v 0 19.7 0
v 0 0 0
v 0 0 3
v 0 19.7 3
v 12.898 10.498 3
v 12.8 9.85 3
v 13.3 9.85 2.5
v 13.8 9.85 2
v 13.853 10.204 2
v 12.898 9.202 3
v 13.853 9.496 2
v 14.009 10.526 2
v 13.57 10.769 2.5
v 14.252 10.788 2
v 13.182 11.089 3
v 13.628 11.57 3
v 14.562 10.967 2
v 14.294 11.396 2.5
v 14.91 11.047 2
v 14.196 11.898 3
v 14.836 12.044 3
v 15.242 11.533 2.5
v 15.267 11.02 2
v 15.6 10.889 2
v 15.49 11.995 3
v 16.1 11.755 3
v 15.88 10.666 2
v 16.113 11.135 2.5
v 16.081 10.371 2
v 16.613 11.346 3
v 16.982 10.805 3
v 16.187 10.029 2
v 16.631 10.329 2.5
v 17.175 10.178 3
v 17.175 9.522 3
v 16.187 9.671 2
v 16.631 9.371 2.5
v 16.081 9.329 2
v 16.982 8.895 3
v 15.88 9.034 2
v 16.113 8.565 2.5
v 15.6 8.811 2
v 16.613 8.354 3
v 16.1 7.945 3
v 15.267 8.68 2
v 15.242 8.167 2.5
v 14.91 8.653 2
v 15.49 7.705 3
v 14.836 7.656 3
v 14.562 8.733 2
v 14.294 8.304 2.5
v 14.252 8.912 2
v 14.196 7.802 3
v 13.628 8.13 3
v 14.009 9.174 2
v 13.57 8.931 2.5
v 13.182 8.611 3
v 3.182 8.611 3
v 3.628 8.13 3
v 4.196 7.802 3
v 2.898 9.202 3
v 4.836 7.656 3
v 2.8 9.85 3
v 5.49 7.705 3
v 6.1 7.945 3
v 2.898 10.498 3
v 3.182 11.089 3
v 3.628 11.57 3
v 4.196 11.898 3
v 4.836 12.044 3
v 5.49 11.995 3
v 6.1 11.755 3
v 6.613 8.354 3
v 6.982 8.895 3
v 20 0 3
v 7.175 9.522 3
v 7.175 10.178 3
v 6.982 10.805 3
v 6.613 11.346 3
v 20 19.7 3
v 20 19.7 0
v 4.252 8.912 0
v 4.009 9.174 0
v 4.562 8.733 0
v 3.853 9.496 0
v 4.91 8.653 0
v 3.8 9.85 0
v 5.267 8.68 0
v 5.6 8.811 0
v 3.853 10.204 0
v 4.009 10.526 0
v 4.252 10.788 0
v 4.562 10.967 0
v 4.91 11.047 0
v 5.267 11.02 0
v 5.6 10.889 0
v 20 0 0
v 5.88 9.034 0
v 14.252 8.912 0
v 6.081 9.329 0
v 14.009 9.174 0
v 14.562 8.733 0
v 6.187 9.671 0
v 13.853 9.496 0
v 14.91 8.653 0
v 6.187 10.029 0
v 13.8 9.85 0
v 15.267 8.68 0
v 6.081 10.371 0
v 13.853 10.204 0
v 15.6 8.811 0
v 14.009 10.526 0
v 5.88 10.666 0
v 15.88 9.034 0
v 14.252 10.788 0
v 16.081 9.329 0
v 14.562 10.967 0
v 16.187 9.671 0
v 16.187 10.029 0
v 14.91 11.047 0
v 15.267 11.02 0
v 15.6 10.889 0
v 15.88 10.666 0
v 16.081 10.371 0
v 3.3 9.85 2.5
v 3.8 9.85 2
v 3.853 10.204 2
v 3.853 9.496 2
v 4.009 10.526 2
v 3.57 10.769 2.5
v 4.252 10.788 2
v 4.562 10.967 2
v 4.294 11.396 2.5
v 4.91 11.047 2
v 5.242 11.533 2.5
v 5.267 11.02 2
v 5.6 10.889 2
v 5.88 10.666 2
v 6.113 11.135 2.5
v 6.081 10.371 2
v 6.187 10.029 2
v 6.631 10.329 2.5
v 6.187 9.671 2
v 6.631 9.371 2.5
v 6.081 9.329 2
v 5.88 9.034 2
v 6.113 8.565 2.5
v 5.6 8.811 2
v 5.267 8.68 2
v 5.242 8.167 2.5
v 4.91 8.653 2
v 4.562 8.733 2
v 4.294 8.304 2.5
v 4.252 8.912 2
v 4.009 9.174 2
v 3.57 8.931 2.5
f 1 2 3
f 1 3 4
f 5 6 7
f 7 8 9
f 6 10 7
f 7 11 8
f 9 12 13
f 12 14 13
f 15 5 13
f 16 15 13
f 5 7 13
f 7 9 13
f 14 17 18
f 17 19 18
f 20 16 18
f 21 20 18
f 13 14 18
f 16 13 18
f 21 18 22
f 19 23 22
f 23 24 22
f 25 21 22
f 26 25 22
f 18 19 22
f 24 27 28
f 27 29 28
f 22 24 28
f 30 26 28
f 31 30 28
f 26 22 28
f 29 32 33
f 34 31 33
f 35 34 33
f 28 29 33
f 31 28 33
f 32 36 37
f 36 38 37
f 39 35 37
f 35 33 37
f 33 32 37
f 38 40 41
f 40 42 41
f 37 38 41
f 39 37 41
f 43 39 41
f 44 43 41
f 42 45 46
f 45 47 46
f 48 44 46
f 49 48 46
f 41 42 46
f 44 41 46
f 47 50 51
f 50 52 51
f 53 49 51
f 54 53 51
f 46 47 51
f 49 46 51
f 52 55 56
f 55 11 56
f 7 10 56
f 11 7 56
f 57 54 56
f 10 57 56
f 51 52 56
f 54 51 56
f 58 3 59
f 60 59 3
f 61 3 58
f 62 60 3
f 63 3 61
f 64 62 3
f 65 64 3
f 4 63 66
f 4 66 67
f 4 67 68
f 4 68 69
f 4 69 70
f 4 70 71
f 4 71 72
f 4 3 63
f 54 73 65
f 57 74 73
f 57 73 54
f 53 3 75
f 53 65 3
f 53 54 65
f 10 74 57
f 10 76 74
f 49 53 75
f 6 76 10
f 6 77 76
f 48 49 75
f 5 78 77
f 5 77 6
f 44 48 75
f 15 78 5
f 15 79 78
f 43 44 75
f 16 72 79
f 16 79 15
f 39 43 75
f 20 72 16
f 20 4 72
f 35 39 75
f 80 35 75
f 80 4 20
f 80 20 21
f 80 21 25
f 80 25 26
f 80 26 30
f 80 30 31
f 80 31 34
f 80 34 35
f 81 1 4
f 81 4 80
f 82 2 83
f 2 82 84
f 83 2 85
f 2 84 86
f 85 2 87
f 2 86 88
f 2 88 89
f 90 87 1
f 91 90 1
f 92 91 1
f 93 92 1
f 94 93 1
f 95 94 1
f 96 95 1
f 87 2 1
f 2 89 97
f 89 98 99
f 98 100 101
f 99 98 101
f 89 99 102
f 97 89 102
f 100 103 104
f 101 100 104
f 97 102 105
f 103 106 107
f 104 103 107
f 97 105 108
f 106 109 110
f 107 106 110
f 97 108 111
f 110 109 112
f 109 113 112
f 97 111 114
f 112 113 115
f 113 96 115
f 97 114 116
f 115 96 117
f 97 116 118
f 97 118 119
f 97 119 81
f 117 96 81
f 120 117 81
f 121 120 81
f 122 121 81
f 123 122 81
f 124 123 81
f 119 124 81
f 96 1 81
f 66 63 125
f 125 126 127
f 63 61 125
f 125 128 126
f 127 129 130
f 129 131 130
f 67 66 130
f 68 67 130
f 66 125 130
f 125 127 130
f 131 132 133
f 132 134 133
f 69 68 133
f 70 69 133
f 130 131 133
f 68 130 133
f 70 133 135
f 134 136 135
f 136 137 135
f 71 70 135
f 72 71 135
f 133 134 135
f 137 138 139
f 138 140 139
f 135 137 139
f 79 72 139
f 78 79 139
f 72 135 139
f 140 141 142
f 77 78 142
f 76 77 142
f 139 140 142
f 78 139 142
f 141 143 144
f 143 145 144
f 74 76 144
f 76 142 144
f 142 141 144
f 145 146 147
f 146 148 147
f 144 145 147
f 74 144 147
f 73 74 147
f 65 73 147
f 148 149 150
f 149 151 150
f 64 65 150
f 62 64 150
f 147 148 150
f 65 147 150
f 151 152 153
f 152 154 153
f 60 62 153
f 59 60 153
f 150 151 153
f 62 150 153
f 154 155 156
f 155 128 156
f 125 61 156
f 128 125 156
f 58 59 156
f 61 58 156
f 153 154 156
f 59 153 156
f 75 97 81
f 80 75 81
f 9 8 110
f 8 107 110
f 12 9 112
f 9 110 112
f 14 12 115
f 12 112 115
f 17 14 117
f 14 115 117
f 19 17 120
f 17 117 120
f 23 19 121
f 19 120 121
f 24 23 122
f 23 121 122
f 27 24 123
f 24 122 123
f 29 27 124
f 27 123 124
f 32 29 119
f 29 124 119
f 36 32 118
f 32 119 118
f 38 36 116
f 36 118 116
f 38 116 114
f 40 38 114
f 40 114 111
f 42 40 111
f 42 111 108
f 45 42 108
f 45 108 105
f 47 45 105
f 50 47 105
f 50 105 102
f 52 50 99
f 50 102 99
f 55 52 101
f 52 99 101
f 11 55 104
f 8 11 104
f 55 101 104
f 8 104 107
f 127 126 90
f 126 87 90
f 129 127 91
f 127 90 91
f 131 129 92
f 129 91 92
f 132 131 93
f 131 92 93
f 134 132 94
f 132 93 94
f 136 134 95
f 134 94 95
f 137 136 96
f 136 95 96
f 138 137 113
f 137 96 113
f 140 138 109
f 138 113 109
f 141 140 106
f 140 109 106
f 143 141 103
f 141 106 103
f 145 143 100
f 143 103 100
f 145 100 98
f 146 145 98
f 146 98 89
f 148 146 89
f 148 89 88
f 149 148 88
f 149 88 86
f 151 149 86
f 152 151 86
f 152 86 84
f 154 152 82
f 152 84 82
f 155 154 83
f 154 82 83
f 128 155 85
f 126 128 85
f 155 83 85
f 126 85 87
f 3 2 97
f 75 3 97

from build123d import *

# Parameters (mm, degrees)
SCHIZZO1_W                             = 20
SCHIZZO1_H                             = 19.7
ESTRUSIONE_ESTRUSIONE1_DEPTH           = 3
FORO_SVASATO_PER_VITE_M2_2_D           = 2.4
FORO_SVASATO_PER_VITE_M2_2_CSINK_D     = 4.4
FORO_SVASATO_PER_VITE_M2_2_CSINK_ANGLE = 90


with BuildPart() as part:
    # Schizzo1 → Estrusione-Estrusione1 (new body)
    with BuildSketch(Plane.XY):
        with Locations((10, 9.85)):
            Rectangle(SCHIZZO1_W, SCHIZZO1_H)
    extrude(amount=ESTRUSIONE_ESTRUSIONE1_DEPTH)

    # Foro svasato per Vite M2-2 (through all)
    with Locations(Plane.XY.offset(3)):
        with Locations((5, 9.85), (15, 9.85)):
            CounterSinkHole(FORO_SVASATO_PER_VITE_M2_2_D / 2, FORO_SVASATO_PER_VITE_M2_2_CSINK_D / 2, counter_sink_angle=FORO_SVASATO_PER_VITE_M2_2_CSINK_ANGLE)


solid = part.part
